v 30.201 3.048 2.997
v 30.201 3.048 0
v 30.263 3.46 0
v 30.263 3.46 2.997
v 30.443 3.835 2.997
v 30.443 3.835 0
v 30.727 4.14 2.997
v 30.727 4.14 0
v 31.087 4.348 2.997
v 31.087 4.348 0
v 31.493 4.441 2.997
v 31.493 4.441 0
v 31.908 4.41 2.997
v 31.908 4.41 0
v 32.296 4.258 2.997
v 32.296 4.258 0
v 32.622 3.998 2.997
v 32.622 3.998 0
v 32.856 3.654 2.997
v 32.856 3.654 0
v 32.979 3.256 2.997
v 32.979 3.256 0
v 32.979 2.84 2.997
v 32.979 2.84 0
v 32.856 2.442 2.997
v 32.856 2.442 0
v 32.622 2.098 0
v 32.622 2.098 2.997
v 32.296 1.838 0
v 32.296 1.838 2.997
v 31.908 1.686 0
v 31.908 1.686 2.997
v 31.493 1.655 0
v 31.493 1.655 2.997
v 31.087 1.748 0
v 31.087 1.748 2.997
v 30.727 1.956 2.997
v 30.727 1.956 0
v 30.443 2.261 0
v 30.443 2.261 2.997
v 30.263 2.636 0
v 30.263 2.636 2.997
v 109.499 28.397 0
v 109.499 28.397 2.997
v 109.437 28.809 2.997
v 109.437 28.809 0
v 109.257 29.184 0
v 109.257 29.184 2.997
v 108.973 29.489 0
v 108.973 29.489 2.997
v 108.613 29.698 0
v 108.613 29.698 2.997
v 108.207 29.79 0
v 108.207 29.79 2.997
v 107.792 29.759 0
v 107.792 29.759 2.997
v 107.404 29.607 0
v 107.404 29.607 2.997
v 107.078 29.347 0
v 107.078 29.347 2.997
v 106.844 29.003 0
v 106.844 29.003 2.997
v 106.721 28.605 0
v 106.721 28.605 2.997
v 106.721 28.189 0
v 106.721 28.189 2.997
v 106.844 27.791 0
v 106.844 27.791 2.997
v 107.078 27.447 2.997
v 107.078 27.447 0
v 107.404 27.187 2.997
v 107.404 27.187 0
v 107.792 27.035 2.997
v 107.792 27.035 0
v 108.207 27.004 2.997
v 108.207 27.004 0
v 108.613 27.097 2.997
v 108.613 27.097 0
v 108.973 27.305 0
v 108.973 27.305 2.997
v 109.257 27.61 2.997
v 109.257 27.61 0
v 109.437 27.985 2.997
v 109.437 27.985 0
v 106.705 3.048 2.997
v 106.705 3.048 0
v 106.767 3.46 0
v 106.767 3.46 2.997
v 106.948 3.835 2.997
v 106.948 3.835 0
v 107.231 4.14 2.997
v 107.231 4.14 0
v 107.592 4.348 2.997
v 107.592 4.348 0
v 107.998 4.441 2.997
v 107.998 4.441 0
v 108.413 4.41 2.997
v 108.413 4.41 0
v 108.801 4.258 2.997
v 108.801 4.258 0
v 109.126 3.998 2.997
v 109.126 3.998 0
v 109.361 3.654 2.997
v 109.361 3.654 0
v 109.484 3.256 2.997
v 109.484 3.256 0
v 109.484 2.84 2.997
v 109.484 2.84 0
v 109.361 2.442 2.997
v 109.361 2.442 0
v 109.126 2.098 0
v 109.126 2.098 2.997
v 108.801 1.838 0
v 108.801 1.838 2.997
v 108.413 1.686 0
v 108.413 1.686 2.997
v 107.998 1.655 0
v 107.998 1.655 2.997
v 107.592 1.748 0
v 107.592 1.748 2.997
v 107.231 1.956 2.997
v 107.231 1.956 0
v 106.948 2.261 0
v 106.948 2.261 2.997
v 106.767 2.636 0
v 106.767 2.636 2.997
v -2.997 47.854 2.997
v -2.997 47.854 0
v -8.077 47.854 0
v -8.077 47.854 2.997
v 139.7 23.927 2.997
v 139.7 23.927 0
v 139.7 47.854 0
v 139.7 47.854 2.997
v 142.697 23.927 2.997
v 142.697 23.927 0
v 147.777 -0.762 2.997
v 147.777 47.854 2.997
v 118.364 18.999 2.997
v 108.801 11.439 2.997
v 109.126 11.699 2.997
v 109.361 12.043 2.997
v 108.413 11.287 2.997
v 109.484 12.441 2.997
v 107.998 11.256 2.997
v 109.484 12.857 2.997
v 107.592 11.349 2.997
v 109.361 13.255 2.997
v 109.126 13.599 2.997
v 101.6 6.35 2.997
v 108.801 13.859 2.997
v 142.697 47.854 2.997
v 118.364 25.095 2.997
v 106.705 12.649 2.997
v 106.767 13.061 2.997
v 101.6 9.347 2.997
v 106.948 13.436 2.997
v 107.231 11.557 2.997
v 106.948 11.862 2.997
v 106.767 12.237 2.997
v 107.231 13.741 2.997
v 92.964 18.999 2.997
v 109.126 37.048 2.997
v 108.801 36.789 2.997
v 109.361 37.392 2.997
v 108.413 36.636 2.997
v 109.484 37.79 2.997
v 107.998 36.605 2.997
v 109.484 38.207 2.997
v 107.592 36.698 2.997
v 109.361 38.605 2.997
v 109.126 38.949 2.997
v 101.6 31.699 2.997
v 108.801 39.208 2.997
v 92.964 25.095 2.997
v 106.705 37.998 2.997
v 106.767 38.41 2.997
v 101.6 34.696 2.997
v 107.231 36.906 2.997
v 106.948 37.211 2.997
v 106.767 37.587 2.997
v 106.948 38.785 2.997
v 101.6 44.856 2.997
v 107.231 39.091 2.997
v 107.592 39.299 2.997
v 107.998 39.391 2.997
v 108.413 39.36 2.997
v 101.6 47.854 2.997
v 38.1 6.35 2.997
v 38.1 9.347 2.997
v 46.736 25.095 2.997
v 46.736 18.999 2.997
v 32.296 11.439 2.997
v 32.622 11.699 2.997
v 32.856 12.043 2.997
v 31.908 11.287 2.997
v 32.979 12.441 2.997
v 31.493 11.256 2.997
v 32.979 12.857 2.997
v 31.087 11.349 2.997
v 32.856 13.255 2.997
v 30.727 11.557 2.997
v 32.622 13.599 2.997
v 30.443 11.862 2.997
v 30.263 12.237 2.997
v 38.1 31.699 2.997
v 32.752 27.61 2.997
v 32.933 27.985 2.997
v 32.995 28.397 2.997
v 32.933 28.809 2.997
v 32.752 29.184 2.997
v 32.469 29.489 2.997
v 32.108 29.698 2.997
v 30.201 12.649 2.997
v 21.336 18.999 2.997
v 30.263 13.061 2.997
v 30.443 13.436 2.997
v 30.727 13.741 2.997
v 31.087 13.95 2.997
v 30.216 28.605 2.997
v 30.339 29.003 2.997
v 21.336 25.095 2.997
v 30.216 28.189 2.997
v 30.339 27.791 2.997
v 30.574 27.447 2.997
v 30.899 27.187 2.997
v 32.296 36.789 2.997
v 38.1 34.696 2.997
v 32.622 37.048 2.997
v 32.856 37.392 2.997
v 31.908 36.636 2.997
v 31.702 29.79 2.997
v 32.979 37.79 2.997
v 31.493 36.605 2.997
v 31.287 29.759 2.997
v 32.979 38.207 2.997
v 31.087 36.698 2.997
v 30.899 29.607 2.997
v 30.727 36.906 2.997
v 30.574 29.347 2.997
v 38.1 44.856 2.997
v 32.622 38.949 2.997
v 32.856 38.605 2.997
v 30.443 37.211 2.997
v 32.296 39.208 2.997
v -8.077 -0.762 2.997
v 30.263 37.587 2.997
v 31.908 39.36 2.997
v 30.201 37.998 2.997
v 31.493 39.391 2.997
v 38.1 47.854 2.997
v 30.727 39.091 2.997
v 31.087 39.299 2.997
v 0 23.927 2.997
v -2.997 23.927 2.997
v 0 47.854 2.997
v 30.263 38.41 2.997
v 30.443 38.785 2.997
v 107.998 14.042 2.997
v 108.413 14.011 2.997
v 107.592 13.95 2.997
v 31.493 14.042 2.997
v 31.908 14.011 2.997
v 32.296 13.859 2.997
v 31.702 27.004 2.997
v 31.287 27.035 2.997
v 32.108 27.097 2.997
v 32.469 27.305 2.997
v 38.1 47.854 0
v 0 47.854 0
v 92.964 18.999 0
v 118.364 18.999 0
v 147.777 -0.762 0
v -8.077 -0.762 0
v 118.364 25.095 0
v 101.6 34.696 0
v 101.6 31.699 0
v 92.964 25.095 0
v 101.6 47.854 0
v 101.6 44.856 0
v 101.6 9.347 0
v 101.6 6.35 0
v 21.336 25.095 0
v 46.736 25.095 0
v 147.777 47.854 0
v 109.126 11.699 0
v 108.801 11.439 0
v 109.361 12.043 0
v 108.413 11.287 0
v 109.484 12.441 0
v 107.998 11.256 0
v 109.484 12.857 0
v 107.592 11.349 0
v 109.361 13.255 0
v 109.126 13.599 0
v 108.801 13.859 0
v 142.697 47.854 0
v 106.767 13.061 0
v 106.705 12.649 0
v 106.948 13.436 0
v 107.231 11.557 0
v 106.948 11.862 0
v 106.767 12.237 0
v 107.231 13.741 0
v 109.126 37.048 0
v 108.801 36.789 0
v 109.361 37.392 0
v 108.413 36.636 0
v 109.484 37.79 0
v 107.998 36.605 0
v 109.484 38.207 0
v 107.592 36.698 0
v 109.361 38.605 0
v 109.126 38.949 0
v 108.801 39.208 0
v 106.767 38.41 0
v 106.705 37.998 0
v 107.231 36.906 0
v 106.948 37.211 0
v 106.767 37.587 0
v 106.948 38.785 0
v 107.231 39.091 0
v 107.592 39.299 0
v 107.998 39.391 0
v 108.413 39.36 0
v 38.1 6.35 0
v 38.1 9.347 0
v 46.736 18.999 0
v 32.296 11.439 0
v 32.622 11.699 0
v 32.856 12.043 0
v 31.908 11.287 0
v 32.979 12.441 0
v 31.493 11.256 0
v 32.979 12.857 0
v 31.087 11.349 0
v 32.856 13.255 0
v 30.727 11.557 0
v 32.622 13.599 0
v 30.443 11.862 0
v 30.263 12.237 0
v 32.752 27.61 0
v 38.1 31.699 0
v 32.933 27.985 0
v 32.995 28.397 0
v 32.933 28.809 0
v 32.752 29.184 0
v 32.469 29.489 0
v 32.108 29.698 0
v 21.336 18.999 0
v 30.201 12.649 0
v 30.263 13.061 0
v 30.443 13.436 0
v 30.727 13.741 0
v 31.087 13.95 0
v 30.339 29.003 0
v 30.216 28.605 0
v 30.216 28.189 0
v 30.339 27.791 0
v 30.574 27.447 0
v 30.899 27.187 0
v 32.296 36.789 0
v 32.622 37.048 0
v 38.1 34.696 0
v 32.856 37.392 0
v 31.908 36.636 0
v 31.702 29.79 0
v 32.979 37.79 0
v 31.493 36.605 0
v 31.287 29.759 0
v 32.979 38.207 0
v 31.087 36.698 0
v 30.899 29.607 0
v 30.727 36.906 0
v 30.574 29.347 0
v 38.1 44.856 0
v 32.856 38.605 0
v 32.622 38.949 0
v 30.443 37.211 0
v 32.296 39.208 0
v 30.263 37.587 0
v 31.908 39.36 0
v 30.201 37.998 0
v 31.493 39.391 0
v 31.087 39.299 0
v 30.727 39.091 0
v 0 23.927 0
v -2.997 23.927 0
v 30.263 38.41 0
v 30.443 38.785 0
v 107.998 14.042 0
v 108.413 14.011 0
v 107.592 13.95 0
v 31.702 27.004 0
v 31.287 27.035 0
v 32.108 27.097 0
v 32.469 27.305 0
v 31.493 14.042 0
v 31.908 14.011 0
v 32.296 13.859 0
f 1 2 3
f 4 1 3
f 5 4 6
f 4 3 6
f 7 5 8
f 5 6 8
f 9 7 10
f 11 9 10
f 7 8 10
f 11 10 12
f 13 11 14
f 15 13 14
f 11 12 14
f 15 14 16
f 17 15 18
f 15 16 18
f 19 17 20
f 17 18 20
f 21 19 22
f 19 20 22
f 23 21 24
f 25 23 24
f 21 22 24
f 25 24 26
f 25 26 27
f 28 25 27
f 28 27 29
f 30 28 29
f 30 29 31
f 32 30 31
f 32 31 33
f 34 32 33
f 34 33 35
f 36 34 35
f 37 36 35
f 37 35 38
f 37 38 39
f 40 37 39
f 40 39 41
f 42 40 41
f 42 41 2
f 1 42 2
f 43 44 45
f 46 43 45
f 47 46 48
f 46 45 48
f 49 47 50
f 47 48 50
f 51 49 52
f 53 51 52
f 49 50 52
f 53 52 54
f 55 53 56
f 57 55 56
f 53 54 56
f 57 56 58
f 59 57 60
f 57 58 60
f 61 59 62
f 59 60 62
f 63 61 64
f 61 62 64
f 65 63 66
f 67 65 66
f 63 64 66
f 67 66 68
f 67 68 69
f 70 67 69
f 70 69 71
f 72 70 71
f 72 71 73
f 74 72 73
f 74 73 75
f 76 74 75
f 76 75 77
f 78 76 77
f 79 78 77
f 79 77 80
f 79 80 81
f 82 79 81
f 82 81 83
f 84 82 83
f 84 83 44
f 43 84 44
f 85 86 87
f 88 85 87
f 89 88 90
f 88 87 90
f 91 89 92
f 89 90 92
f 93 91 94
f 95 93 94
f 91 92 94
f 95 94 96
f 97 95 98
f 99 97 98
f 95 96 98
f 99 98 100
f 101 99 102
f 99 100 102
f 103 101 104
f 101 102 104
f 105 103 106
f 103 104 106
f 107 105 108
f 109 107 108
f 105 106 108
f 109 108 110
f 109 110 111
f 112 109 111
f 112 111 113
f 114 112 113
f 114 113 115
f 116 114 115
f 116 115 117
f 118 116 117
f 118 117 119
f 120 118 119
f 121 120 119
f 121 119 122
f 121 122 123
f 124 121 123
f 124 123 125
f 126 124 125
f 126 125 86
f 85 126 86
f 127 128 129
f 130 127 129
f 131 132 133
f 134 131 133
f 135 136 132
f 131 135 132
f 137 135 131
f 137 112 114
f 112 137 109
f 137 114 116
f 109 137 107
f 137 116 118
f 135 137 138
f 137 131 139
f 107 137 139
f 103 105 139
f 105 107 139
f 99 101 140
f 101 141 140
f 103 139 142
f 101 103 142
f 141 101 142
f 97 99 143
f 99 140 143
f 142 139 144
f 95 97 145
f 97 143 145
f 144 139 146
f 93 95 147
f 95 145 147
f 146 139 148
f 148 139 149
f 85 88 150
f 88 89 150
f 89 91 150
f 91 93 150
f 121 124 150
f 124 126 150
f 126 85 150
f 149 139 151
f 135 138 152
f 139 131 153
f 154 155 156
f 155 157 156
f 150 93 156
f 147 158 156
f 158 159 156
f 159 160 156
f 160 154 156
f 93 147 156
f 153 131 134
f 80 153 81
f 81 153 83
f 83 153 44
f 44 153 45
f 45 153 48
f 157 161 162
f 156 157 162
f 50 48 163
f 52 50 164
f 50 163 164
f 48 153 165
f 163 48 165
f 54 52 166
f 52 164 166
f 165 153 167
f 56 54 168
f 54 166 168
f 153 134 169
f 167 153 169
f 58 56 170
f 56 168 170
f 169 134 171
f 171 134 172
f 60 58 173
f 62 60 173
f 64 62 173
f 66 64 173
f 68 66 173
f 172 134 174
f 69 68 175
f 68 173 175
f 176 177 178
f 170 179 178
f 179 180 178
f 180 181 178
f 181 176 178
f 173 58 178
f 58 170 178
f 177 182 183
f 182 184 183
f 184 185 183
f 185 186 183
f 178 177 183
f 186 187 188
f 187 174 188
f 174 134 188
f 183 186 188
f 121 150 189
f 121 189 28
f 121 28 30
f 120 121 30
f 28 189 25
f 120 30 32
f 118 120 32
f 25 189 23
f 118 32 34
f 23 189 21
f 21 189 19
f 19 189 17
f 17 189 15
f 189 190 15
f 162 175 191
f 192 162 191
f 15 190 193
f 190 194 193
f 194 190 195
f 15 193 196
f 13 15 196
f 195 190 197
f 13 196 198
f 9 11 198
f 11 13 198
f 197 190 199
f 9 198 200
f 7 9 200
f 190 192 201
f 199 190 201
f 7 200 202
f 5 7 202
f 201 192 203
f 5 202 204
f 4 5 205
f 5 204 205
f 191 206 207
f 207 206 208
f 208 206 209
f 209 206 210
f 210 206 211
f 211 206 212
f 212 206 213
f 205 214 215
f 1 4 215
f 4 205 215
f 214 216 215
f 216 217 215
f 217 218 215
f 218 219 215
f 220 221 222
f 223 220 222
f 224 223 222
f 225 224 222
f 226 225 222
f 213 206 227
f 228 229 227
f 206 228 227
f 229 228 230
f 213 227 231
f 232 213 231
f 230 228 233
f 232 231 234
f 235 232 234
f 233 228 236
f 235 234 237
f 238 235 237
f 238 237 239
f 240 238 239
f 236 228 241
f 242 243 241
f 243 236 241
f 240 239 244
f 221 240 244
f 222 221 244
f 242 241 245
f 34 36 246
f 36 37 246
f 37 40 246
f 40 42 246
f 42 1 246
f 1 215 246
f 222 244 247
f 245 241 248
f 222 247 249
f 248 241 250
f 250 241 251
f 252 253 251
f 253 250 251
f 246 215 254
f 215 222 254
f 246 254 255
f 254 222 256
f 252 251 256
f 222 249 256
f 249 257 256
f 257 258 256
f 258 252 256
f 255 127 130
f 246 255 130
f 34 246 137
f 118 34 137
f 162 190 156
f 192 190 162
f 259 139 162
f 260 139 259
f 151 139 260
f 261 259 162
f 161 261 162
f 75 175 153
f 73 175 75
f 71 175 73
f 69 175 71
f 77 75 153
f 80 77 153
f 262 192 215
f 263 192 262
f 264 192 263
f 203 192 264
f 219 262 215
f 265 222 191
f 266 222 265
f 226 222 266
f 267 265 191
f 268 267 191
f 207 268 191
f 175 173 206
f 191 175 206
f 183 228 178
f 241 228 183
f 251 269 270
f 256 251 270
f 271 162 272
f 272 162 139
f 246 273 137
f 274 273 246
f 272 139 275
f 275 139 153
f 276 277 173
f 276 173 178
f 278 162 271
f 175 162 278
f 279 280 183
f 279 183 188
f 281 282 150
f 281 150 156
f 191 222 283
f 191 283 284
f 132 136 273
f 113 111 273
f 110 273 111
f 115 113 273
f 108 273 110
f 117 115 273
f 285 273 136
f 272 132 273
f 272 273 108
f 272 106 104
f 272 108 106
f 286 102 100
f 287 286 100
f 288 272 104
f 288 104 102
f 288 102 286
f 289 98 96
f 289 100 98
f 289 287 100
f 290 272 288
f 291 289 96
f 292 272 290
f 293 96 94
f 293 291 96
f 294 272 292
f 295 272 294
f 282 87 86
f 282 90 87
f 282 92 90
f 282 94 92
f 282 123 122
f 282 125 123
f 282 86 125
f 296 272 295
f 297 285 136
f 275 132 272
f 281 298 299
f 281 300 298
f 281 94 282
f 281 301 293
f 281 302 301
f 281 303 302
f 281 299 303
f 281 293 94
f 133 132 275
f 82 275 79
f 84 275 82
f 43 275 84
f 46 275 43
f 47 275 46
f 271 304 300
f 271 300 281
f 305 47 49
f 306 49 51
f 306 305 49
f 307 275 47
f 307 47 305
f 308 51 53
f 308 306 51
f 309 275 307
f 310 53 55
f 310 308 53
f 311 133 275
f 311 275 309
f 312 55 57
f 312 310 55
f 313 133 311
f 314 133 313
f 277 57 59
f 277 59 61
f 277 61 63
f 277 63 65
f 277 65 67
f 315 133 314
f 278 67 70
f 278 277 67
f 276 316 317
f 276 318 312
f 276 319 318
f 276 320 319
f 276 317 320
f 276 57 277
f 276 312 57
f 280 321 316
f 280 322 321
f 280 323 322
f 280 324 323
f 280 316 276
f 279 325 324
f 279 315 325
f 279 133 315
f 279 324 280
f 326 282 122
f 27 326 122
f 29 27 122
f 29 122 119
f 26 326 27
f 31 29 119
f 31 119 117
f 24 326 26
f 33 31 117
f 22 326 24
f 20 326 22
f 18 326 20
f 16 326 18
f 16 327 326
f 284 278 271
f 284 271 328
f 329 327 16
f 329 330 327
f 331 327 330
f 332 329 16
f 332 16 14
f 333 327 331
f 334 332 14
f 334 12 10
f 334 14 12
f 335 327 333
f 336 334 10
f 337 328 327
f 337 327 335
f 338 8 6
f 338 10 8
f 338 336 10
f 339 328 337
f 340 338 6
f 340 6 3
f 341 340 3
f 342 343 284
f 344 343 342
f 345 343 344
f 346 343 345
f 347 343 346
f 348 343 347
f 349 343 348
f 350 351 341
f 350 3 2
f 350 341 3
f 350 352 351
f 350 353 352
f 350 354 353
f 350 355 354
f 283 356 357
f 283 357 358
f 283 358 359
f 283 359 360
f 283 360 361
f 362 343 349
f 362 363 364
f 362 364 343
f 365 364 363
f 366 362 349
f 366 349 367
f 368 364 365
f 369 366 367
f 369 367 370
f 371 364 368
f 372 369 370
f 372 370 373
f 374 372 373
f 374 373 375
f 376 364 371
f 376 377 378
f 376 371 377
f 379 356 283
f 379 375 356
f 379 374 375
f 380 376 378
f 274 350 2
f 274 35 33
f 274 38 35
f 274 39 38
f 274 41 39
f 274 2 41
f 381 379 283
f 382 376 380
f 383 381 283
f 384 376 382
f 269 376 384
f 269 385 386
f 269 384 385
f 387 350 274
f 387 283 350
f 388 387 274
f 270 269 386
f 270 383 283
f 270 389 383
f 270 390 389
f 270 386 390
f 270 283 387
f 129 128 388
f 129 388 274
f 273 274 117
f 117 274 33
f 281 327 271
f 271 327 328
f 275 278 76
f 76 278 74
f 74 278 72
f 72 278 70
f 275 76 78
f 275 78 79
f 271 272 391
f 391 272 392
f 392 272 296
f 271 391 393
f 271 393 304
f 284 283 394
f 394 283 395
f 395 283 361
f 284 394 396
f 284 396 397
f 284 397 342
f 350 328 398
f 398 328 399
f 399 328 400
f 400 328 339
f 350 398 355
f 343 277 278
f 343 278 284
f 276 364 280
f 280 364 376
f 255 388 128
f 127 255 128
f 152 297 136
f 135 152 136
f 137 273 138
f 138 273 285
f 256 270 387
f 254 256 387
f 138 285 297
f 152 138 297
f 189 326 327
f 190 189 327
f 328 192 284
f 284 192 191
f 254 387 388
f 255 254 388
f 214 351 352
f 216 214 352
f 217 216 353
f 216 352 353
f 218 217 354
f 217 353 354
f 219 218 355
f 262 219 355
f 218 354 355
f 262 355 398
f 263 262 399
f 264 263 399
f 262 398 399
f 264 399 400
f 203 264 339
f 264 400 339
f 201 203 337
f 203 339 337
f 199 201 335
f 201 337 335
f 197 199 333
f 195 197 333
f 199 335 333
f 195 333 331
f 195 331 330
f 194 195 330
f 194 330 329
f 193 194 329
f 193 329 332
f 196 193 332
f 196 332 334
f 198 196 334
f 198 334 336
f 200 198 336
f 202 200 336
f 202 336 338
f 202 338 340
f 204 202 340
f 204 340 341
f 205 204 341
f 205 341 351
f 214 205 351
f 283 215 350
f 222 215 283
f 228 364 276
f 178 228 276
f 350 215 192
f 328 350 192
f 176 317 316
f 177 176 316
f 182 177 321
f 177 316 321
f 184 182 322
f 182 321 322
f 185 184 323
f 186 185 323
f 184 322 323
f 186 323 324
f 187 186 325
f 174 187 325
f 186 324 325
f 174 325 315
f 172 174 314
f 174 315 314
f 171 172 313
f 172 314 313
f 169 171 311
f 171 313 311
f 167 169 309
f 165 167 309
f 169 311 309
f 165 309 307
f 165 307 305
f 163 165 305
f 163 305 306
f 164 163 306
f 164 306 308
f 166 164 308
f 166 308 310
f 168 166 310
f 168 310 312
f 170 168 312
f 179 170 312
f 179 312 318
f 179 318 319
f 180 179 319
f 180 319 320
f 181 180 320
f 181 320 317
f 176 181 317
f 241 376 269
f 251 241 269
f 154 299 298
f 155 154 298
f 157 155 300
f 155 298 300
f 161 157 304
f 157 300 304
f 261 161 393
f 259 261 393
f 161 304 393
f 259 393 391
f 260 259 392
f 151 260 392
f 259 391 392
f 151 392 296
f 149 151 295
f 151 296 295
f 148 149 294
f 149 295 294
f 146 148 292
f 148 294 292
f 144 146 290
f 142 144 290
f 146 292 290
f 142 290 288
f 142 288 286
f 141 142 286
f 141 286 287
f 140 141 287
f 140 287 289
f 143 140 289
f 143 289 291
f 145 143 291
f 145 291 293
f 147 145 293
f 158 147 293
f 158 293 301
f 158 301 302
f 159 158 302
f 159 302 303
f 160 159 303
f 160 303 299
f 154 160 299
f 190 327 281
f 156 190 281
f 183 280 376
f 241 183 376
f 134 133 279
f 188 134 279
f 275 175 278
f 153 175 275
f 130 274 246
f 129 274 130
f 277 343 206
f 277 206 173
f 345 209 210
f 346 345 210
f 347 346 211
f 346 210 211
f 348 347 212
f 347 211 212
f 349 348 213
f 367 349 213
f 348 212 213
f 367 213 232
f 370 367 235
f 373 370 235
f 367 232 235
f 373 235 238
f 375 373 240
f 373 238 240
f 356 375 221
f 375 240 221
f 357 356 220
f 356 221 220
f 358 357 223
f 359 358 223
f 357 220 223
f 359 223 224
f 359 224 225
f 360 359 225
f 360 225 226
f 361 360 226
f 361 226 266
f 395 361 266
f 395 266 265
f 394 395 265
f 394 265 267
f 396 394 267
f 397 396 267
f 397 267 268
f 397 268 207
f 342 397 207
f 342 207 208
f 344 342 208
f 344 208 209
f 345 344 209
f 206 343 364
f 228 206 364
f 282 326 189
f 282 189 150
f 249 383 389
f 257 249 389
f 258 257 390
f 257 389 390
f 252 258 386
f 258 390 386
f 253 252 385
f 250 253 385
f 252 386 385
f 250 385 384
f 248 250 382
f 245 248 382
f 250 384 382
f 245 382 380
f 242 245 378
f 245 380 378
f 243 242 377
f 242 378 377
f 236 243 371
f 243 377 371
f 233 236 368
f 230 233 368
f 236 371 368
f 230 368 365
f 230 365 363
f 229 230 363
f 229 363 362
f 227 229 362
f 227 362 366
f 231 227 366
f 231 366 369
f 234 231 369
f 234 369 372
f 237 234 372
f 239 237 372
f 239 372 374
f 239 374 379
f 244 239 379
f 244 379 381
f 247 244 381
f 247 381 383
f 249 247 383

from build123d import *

# Parameters (mm, degrees)
SKETCH1_W           = 114.3
SKETCH1_H           = 2.9972
BOSS_EXTRUDE1_DEPTH = 2.9972
SKETCH2_R           = 1.397
CUT_EXTRUDE1_DEPTH  = 3.9972
SKETCH3_W           = 25.4
SKETCH3_H           = 2.9972
BOSS_EXTRUDE2_DEPTH = 2.9972
SKETCH4_W           = 155.8544
SKETCH4_H           = 0.762
BOSS_EXTRUDE3_DEPTH = 2.9972
SKETCH5_R           = 1.397
CUT_EXTRUDE2_DEPTH  = 3.9972
SKETCH7_R           = 1.397
CUT_EXTRUDE3_DEPTH  = 3.9972
SKETCH6_W           = 25.4
SKETCH6_H           = 6.096
CUT_EXTRUDE4_DEPTH  = 3.9972


with BuildPart() as part:
    # Sketch1 → Boss-Extrude1 (new body)
    with BuildSketch(Plane.XY):
        Polygon((139.7, 23.9268), (139.7, 0), (147.7772, 0), (147.7772, 47.8536), (142.6972, 47.8536), (142.6972, 23.9268), align=None)
        Polygon((0, 23.9268), (0, 0), (139.7, 0), (139.7, 23.9268), (139.7, 47.8536), (127, 47.8536), (127, 44.8564), (12.7, 44.8564), (12.7, 47.8536), (0, 47.8536), align=None)
        with Locations((69.85, 7.8486)):
            Rectangle(SKETCH1_W, SKETCH1_H, mode=Mode.SUBTRACT)
        with Locations((69.85, 33.1978)):
            Rectangle(SKETCH1_W, SKETCH1_H, mode=Mode.SUBTRACT)
        Polygon((-8.0772, 0), (0, 0), (0, 23.9268), (-2.9972, 23.9268), (-2.9972, 47.8536), (-8.0772, 47.8536), align=None)
    extrude(amount=BOSS_EXTRUDE1_DEPTH)

    # Sketch2 → Cut-Extrude1 (cut, through all)
    with BuildSketch(Plane(origin=(0, 0, 0), x_dir=(-1, 0, 0), z_dir=(0, 0, -1))):
        with Locations((-108.1024, 12.6492)):
            Circle(SKETCH2_R)
        with Locations((-31.5976, 12.6492)):
            Circle(SKETCH2_R)
        with Locations((-108.1024, 37.9984)):
            Circle(SKETCH2_R)
        with Locations((-31.5976, 37.9984)):
            Circle(SKETCH2_R)
    extrude(amount=-CUT_EXTRUDE1_DEPTH, mode=Mode.SUBTRACT)

    # Sketch3 → Boss-Extrude2 (add)
    with BuildSketch(Plane(origin=(0, 0, 0), x_dir=(-1, 0, 0), z_dir=(0, 0, -1))):
        with Locations((-114.3, 46.355)):
            Rectangle(SKETCH3_W, SKETCH3_H)
        with Locations((-114.3, 33.1978)):
            Rectangle(SKETCH3_W, SKETCH3_H)
        with Locations((-114.3, 7.8486)):
            Rectangle(SKETCH3_W, SKETCH3_H)
        with Locations((-25.4, 7.8486)):
            Rectangle(SKETCH3_W, SKETCH3_H)
        with Locations((-25.4, 33.1978)):
            Rectangle(SKETCH3_W, SKETCH3_H)
        with Locations((-25.4, 46.355)):
            Rectangle(SKETCH3_W, SKETCH3_H)
    extrude(amount=-BOSS_EXTRUDE2_DEPTH)

    # Sketch4 → Boss-Extrude3 (add)
    with BuildSketch(Plane(origin=(0, 0, 0), x_dir=(-1, 0, 0), z_dir=(0, 0, -1))):
        with Locations((-69.85, -0.381)):
            Rectangle(SKETCH4_W, SKETCH4_H)
    extrude(amount=-BOSS_EXTRUDE3_DEPTH)

    # Sketch5 → Cut-Extrude2 (cut, through all)
    with BuildSketch(Plane.XY.offset(2.9972)):
        with Locations((31.5976, 28.3972)):
            Circle(SKETCH5_R)
        with Locations((108.1024, 28.3972)):
            Circle(SKETCH5_R)
    extrude(amount=-CUT_EXTRUDE2_DEPTH, mode=Mode.SUBTRACT)

    # Sketch7 → Cut-Extrude3 (cut, through all)
    with BuildSketch(Plane(origin=(0, 0, 0), x_dir=(-1, 0, 0), z_dir=(0, 0, -1))):
        with Locations((-108.1024, 3.048)):
            Circle(SKETCH7_R)
        with Locations((-31.5976, 3.048)):
            Circle(SKETCH7_R)
    extrude(amount=-CUT_EXTRUDE3_DEPTH, mode=Mode.SUBTRACT)

    # Sketch6 → Cut-Extrude4 (cut, through all)
    with BuildSketch(Plane.XY.offset(2.9972)):
        with Locations((34.036, 22.0472)):
            Rectangle(SKETCH6_W, SKETCH6_H)
        with Locations((105.664, 22.0472)):
            Rectangle(SKETCH6_W, SKETCH6_H)
    extrude(amount=-CUT_EXTRUDE4_DEPTH, mode=Mode.SUBTRACT)


solid = part.part
